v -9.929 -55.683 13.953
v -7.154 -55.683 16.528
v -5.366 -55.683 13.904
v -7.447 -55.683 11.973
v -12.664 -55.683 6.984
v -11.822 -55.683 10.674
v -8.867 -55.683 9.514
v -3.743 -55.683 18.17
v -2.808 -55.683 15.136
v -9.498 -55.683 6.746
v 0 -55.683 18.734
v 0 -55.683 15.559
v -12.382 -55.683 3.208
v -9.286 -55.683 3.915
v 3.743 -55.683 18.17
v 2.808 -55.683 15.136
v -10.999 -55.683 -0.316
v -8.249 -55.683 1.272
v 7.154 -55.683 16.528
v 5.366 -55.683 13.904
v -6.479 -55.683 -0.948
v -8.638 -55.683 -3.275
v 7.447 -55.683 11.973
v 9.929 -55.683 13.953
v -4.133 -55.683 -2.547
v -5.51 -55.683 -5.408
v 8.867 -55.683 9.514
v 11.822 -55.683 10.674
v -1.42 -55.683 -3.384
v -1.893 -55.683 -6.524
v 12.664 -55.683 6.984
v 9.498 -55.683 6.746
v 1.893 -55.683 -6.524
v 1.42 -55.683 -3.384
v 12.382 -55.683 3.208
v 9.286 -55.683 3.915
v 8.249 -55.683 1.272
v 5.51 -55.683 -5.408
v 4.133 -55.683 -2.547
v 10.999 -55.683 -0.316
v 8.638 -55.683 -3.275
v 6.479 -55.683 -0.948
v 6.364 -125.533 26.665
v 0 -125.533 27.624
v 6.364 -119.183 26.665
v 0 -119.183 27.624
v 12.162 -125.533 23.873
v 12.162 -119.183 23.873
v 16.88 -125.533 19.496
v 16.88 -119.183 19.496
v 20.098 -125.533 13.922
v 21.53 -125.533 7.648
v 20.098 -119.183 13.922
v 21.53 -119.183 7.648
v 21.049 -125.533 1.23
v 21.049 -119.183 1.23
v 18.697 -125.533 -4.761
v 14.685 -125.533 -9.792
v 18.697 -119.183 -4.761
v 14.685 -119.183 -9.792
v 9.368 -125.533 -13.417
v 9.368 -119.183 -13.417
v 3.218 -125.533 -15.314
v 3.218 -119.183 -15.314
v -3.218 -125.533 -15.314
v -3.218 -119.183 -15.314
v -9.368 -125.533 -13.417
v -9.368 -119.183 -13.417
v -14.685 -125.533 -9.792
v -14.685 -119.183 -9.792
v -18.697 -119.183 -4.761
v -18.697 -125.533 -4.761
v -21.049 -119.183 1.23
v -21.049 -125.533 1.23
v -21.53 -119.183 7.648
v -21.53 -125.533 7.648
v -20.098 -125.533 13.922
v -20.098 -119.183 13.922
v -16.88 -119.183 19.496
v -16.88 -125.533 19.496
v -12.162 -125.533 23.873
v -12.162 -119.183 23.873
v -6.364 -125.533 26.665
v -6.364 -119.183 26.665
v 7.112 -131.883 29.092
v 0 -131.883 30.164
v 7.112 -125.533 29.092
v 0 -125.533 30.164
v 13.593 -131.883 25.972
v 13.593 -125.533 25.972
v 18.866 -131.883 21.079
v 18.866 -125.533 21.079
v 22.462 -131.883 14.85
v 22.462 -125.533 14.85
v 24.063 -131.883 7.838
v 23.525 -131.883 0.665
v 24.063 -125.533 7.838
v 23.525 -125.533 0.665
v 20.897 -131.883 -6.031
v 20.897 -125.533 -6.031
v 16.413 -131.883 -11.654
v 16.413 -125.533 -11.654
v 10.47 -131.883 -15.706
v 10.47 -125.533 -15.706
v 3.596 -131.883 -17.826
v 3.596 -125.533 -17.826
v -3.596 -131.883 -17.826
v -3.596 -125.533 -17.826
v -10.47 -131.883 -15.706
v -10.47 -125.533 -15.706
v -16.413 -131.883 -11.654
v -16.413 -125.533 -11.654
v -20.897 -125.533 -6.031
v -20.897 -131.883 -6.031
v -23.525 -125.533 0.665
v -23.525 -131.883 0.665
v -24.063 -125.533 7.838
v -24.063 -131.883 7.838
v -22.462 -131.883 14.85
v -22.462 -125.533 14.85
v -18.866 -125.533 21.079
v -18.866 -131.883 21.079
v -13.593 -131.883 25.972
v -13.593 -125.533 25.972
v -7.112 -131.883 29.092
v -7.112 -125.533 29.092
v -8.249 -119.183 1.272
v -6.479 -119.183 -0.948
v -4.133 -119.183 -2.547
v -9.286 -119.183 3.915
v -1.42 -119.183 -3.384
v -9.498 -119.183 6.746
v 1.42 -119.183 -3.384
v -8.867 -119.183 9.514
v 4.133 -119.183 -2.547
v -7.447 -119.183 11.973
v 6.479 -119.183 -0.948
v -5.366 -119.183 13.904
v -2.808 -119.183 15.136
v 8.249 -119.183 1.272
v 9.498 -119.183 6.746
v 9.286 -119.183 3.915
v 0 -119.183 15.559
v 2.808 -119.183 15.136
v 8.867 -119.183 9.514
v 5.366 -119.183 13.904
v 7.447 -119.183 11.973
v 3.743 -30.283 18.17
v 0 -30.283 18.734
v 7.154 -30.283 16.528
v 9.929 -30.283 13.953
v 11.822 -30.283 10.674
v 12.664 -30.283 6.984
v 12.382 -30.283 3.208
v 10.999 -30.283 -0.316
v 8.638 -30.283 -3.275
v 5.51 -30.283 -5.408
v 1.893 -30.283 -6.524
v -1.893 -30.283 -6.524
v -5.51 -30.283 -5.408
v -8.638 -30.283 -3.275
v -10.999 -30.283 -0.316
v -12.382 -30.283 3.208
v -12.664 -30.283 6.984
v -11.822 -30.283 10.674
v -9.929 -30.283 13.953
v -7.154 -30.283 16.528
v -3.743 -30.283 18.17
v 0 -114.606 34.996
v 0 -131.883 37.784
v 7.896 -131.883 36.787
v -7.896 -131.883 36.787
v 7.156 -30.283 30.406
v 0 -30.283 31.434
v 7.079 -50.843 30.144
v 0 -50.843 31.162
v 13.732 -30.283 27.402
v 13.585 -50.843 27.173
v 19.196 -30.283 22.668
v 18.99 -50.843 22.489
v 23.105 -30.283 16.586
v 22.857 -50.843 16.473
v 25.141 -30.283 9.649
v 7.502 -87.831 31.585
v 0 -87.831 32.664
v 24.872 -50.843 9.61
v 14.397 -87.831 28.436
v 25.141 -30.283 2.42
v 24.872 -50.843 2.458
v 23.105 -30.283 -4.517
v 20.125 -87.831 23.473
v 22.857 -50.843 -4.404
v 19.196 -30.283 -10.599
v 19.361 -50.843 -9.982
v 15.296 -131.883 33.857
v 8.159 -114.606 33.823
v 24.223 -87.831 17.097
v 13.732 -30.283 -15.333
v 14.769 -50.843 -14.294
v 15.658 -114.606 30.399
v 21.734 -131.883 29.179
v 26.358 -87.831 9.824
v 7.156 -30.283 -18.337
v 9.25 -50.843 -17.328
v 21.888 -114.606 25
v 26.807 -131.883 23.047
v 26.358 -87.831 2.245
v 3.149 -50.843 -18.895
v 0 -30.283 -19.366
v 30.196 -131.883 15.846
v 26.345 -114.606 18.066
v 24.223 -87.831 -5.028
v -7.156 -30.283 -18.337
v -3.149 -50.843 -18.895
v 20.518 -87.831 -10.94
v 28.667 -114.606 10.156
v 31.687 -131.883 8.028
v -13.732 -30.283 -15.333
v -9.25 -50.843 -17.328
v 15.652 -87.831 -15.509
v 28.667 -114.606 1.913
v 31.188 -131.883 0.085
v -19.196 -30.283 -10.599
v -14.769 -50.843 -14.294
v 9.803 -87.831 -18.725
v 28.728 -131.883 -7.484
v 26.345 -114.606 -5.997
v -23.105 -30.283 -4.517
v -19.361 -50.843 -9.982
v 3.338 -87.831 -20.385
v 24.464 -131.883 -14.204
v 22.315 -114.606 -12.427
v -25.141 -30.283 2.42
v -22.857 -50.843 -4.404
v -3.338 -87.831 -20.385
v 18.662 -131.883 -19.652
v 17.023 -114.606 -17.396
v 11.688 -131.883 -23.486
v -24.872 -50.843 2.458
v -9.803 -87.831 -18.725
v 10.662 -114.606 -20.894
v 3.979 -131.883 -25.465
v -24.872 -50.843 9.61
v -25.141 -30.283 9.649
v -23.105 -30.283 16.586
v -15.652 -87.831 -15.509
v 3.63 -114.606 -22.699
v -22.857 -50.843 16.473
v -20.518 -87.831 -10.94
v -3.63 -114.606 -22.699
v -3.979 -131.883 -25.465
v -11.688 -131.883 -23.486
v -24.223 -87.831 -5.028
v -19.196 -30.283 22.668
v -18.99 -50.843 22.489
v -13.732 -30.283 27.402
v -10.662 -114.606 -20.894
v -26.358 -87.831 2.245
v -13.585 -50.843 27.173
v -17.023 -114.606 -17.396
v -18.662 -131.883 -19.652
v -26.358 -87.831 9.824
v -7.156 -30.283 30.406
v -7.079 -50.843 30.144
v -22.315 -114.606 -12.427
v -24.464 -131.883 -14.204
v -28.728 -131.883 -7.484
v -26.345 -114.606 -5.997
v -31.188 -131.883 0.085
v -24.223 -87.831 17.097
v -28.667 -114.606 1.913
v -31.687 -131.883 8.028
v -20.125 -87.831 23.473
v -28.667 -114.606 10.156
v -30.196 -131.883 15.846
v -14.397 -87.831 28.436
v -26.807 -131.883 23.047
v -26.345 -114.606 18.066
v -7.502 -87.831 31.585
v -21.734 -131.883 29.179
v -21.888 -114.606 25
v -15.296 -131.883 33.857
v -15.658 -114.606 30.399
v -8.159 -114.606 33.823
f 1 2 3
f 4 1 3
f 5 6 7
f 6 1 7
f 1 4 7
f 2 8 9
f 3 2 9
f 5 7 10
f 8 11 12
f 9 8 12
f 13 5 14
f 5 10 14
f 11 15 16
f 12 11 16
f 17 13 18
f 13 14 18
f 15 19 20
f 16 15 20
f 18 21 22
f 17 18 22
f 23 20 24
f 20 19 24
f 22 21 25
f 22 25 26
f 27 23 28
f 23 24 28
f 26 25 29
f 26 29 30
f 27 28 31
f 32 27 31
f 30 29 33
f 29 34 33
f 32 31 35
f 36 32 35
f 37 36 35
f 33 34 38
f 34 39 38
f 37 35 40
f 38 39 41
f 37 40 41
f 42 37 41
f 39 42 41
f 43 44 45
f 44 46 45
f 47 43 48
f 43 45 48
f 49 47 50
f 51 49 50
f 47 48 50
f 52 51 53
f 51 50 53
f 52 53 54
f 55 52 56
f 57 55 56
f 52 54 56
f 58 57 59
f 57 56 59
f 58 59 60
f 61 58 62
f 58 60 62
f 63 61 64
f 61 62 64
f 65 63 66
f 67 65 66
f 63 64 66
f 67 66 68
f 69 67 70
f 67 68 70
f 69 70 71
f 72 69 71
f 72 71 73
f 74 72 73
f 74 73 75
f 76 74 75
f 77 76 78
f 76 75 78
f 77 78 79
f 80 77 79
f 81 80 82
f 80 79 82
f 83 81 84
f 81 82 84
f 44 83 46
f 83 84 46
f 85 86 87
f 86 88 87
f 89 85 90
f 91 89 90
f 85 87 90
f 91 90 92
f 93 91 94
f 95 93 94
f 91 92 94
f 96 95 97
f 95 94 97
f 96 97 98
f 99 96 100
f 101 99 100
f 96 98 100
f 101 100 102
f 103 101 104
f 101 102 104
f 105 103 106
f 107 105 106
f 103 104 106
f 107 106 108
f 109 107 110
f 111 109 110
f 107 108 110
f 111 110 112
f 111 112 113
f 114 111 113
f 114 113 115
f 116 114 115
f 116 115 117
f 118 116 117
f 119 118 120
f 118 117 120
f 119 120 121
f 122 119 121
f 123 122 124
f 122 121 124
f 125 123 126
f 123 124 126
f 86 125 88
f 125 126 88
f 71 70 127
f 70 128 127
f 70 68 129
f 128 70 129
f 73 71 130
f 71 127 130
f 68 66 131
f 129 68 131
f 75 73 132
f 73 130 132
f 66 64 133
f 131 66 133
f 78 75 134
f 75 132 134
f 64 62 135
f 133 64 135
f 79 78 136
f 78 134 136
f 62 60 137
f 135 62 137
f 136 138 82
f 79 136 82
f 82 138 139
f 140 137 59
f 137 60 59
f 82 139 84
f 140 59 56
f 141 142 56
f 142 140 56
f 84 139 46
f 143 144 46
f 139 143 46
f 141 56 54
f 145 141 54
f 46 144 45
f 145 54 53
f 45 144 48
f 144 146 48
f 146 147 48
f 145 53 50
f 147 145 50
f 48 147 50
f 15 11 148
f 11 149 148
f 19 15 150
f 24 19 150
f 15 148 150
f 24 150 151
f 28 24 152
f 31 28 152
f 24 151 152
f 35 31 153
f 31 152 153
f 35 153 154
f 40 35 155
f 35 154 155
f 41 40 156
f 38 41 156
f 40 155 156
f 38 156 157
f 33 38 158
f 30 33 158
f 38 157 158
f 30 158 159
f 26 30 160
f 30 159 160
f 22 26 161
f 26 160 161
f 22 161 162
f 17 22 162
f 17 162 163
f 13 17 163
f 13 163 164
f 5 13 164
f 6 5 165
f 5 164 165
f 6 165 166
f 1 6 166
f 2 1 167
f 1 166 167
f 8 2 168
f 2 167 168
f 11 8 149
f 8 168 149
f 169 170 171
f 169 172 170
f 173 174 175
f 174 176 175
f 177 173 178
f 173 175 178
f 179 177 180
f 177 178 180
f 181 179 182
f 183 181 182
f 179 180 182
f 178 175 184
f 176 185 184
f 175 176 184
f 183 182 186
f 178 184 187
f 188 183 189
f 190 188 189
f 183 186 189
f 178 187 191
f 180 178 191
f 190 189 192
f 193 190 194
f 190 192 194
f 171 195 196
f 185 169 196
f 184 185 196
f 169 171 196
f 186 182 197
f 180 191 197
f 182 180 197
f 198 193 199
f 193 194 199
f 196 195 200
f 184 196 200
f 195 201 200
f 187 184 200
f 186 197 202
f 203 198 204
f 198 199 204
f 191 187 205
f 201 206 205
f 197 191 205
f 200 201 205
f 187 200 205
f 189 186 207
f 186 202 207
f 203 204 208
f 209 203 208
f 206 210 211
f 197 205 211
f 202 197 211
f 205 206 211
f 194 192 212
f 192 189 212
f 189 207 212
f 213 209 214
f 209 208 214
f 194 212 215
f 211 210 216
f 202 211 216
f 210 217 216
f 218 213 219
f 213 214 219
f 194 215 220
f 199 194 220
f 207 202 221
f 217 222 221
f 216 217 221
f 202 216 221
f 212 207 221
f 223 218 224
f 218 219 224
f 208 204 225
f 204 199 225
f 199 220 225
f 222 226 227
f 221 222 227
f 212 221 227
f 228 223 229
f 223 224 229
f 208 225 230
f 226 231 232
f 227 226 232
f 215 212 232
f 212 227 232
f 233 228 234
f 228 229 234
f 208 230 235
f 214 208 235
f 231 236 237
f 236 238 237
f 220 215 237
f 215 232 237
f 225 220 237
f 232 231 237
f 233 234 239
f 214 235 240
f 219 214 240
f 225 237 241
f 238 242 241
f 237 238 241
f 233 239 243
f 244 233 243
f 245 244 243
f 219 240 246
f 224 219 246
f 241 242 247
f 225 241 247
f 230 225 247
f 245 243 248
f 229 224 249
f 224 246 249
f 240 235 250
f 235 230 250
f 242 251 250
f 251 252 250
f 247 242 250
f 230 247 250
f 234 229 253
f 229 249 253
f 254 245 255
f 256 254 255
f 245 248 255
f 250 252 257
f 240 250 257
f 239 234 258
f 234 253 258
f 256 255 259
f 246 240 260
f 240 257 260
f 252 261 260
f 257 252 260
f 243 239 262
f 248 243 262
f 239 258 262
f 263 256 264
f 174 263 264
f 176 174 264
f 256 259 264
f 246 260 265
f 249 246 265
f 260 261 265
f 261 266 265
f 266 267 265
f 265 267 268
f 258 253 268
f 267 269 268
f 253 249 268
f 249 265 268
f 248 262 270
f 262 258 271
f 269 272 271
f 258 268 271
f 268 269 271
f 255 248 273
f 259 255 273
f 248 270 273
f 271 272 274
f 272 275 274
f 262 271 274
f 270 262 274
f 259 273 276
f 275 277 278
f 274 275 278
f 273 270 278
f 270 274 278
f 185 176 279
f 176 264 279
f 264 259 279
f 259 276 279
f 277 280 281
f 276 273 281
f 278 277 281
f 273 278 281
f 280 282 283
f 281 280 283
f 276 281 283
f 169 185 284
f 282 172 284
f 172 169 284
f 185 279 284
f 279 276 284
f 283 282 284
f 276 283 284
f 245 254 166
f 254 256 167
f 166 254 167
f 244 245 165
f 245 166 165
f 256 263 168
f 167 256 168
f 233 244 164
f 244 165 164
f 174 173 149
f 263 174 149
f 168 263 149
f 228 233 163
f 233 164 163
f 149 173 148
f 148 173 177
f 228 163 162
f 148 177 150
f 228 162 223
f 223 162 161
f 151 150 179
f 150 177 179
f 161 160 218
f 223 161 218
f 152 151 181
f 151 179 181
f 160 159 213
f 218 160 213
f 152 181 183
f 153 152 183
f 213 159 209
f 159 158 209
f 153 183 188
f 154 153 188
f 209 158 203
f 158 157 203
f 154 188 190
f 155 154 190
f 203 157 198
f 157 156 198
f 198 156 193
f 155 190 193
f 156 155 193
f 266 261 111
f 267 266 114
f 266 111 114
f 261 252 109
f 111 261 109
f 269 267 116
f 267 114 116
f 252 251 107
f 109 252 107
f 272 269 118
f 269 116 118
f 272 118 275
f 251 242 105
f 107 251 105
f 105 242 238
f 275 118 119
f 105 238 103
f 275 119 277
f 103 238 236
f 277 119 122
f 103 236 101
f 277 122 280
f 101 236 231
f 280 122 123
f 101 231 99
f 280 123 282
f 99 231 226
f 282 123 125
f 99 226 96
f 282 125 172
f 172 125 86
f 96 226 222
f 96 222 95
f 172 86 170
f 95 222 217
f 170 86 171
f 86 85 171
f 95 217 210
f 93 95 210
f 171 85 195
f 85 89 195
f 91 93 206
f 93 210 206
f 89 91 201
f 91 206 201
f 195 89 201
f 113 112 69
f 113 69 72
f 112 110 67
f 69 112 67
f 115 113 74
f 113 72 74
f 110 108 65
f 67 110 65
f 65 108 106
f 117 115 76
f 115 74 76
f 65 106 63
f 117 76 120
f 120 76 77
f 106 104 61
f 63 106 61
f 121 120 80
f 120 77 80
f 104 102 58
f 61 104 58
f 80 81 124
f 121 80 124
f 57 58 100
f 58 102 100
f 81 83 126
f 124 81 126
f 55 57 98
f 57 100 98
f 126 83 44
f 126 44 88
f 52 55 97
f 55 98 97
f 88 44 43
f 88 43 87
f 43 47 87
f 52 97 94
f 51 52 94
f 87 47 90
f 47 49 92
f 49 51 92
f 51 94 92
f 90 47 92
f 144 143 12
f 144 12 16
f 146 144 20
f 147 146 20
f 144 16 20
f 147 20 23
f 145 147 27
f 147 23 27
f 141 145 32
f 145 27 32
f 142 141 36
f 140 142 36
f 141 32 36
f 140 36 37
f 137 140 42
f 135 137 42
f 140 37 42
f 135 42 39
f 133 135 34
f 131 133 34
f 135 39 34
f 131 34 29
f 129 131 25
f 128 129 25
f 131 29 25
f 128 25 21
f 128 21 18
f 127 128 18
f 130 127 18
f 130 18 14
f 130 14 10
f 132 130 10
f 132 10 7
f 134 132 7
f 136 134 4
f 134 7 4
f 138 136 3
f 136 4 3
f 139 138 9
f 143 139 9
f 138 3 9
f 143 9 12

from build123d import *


with BuildPart() as f1:
    # F0 (on Right) → F1 (revolve)
    with BuildSketch(Plane.YZ):
        with BuildLine():
            add(Edge.make_bspline(
                [(-30.2832648158, 31.4344563204), (-39.2876701466, 30.8777280285), (-59.8573779262, 31.2174822431), (-111.2182187798, 33.5696872933), (-126.0642315855, 36.9681688544), (-131.8832648158, 37.7844563204)],
                knots=[0, 0, 0, 0, 0.3192466678, 0.7357239866, 1, 1, 1, 1], degree=3))
            Line((-131.8832648158, 37.7844563204), (-131.8832648158, 30.1644563204))
            Line((-131.8832648158, 30.1644563204), (-125.5332648158, 30.1644563204))
            Line((-125.5332648158, 30.1644563204), (-125.5332648158, 27.6244563204))
            Line((-125.5332648158, 27.6244563204), (-119.1832648158, 27.6244563204))
            Line((-119.1832648158, 27.6244563204), (-119.1832648158, 15.5594563204))
            Line((-119.1832648158, 15.5594563204), (-55.6832648158, 15.5594563204))
            Line((-55.6832648158, 15.5594563204), (-55.6832648158, 18.7344563204))
            Line((-55.6832648158, 18.7344563204), (-30.2832648158, 18.7344563204))
            Line((-30.2832648158, 18.7344563204), (-30.2832648158, 31.4344563204))
        make_face()
    revolve(axis=Axis((0, -81.0832648158, 6.0344563204), (0, 1, 0)))


solid = f1.part
